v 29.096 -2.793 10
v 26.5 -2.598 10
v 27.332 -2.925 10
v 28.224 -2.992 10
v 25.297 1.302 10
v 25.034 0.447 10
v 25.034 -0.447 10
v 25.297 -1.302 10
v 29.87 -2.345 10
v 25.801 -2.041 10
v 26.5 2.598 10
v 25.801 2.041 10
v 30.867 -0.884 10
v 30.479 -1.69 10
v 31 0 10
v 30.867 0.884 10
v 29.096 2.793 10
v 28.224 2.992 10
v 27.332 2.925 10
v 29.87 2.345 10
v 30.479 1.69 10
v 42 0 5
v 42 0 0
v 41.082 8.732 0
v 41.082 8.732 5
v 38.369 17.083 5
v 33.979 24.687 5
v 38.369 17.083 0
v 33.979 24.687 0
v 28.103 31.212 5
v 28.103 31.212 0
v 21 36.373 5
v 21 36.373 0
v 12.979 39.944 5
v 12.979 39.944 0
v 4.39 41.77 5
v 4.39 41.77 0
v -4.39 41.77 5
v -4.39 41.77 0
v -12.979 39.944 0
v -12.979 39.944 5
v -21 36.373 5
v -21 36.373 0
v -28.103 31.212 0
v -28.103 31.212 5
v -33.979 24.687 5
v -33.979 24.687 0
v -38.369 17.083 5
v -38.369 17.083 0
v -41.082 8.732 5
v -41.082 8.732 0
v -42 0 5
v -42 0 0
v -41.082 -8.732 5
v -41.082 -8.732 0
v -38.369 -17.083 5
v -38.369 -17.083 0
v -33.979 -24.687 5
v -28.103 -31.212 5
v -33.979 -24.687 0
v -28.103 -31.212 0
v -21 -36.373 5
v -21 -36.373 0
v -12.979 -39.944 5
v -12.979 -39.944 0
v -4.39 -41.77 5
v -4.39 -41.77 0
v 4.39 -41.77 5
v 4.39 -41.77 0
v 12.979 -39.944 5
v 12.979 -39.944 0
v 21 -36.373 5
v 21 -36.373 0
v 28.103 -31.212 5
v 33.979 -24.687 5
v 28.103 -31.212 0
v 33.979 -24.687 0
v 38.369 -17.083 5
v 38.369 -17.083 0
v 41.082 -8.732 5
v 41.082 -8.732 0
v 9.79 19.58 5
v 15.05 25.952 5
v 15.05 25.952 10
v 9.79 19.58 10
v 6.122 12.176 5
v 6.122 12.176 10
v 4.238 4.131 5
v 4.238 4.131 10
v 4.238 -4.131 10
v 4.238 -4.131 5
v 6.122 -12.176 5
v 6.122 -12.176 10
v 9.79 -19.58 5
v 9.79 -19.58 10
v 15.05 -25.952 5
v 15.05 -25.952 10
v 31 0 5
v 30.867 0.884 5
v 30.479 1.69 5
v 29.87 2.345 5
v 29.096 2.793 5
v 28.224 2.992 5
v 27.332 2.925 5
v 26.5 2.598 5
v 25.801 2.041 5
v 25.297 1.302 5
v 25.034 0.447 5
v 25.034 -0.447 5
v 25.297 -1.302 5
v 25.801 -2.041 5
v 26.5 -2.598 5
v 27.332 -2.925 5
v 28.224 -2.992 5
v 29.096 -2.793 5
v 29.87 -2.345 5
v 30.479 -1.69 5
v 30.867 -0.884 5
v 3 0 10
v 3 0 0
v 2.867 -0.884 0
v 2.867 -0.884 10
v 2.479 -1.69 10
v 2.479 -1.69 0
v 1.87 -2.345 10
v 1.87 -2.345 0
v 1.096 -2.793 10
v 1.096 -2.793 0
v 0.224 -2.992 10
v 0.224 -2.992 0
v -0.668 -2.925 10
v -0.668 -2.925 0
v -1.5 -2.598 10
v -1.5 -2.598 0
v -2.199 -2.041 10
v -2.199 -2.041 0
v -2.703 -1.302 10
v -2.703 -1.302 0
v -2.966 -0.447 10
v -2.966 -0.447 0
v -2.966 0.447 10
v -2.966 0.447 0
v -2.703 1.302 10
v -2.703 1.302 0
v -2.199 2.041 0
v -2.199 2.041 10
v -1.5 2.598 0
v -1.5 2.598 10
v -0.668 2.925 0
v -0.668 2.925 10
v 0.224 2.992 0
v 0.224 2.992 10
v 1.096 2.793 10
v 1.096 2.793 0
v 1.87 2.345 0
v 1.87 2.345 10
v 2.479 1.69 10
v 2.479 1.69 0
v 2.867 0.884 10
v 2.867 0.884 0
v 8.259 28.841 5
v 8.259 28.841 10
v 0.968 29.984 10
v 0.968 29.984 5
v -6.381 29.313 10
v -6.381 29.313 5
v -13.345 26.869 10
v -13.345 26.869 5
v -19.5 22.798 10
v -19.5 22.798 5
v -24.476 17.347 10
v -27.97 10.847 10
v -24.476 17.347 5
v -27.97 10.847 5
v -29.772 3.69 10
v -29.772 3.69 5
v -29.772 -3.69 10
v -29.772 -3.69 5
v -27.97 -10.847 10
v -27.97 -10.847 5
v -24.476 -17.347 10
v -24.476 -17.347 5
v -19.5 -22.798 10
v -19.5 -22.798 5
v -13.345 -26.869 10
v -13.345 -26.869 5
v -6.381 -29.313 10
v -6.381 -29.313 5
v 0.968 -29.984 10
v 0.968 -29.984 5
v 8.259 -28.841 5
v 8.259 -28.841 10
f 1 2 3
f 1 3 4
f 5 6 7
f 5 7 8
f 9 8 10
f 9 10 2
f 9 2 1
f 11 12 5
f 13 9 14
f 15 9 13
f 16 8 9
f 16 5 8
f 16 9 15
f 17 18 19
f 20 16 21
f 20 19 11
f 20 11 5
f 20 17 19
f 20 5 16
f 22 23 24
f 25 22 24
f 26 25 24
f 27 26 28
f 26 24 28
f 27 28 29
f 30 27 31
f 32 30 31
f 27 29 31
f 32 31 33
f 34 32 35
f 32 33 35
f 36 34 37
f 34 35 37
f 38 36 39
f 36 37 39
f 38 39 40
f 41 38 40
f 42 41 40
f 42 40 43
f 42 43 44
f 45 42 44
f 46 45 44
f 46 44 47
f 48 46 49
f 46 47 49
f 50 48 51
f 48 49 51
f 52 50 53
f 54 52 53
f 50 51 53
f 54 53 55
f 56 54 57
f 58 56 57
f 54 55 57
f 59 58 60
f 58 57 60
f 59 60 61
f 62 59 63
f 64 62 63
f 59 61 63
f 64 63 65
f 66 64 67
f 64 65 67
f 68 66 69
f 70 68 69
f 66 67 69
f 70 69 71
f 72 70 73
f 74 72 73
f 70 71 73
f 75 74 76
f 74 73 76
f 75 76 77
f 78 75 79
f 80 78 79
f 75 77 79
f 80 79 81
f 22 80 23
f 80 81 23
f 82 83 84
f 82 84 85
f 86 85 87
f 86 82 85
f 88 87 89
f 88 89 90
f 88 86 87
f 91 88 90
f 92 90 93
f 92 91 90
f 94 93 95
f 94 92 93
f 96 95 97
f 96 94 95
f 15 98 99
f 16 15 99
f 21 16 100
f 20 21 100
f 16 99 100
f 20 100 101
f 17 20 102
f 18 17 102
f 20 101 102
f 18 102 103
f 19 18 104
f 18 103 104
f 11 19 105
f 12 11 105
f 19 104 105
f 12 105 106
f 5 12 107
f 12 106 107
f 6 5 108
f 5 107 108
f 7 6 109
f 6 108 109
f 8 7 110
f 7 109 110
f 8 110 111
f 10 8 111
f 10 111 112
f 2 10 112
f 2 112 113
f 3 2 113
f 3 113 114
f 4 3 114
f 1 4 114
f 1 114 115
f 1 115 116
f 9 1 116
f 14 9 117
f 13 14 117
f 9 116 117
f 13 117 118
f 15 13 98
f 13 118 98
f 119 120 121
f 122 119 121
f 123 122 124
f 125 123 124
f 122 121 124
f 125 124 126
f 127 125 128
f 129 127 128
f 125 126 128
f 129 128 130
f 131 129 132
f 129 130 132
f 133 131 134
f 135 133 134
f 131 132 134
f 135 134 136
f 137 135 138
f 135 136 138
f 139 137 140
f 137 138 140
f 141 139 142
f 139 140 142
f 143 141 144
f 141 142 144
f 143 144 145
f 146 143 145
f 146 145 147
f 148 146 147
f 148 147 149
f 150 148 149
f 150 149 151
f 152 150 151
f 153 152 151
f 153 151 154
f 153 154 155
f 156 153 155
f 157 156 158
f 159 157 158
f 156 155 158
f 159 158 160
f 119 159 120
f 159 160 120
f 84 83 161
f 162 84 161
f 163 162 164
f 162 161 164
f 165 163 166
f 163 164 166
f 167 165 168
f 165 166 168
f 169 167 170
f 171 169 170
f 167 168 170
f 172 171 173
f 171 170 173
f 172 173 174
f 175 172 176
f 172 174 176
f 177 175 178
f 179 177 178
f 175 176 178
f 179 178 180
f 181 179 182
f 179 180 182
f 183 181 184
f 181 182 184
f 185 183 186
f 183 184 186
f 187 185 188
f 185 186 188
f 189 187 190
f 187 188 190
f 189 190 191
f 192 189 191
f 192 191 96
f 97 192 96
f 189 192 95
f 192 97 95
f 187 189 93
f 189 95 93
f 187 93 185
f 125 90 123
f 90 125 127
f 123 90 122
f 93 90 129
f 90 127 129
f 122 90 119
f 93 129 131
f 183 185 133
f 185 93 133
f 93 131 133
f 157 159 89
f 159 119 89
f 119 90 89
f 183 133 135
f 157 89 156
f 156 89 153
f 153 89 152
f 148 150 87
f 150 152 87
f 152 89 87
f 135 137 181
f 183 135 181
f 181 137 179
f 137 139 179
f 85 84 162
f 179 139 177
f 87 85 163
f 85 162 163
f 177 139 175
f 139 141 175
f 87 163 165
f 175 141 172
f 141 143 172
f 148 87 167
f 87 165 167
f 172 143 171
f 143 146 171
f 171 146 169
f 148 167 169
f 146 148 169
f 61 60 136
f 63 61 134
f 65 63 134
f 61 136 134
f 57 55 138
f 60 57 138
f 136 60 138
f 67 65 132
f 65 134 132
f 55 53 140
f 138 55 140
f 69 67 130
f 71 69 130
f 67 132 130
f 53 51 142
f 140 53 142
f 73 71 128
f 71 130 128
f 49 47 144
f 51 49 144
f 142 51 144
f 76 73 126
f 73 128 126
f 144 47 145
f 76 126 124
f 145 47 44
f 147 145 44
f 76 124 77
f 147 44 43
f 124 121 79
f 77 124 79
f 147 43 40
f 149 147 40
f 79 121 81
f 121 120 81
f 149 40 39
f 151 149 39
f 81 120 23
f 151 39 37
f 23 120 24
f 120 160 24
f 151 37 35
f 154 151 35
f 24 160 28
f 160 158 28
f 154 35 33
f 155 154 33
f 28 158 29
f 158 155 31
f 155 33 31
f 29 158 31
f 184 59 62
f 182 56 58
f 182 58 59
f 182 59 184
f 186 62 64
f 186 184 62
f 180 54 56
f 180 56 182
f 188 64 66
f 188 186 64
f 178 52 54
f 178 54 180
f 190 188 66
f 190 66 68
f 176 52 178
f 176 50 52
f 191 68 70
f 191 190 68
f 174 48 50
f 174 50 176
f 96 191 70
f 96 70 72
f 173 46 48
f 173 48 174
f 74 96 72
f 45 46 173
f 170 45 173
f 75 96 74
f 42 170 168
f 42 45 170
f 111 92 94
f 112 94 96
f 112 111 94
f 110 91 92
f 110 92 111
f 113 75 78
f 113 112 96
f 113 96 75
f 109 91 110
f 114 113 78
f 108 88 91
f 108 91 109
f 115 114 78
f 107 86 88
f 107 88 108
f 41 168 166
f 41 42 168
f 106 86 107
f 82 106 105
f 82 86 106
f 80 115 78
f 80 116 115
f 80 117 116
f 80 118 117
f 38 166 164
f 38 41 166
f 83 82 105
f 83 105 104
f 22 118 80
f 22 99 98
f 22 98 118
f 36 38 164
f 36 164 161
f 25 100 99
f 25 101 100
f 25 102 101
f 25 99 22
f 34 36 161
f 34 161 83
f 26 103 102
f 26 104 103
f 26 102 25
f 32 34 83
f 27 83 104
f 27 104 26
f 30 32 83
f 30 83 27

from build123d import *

# Parameters (mm, degrees)
SKETCH_R     = 42
PAD_DEPTH    = 5
SKETCH001_R  = 3
PAD001_DEPTH = 5
PAD002_DEPTH = 5
SKETCH003_R  = 3
POCKET_DEPTH = 10


with BuildPart() as part:
    # Sketch → Pad (new body)
    with BuildSketch(Plane.XY):
        Circle(SKETCH_R)
    extrude(amount=PAD_DEPTH)

    # Sketch001 → Pad001 (new body)
    with BuildSketch(Plane.XY.offset(5)):
        with Locations((28, 0)):
            Circle(SKETCH001_R)
    extrude(amount=PAD001_DEPTH)

    # Sketch002 → Pad002 (new body)
    with BuildSketch(Plane.XY.offset(5)):
        with BuildLine():
            ThreePointArc((15.05, 25.95183), (4, 0), (15.05, -25.95183))
            ThreePointArc((15.05, 25.95183), (-30, 0), (15.05, -25.95183))
        make_face()
    extrude(amount=PAD002_DEPTH)

    # Sketch003 → Pocket (cut)
    with BuildSketch(Plane(origin=(0, 0, 0), x_dir=(1, 0, 0), z_dir=(0, 0, -1))):
        Circle(SKETCH003_R)
    extrude(amount=-POCKET_DEPTH, mode=Mode.SUBTRACT)


solid = part.part
